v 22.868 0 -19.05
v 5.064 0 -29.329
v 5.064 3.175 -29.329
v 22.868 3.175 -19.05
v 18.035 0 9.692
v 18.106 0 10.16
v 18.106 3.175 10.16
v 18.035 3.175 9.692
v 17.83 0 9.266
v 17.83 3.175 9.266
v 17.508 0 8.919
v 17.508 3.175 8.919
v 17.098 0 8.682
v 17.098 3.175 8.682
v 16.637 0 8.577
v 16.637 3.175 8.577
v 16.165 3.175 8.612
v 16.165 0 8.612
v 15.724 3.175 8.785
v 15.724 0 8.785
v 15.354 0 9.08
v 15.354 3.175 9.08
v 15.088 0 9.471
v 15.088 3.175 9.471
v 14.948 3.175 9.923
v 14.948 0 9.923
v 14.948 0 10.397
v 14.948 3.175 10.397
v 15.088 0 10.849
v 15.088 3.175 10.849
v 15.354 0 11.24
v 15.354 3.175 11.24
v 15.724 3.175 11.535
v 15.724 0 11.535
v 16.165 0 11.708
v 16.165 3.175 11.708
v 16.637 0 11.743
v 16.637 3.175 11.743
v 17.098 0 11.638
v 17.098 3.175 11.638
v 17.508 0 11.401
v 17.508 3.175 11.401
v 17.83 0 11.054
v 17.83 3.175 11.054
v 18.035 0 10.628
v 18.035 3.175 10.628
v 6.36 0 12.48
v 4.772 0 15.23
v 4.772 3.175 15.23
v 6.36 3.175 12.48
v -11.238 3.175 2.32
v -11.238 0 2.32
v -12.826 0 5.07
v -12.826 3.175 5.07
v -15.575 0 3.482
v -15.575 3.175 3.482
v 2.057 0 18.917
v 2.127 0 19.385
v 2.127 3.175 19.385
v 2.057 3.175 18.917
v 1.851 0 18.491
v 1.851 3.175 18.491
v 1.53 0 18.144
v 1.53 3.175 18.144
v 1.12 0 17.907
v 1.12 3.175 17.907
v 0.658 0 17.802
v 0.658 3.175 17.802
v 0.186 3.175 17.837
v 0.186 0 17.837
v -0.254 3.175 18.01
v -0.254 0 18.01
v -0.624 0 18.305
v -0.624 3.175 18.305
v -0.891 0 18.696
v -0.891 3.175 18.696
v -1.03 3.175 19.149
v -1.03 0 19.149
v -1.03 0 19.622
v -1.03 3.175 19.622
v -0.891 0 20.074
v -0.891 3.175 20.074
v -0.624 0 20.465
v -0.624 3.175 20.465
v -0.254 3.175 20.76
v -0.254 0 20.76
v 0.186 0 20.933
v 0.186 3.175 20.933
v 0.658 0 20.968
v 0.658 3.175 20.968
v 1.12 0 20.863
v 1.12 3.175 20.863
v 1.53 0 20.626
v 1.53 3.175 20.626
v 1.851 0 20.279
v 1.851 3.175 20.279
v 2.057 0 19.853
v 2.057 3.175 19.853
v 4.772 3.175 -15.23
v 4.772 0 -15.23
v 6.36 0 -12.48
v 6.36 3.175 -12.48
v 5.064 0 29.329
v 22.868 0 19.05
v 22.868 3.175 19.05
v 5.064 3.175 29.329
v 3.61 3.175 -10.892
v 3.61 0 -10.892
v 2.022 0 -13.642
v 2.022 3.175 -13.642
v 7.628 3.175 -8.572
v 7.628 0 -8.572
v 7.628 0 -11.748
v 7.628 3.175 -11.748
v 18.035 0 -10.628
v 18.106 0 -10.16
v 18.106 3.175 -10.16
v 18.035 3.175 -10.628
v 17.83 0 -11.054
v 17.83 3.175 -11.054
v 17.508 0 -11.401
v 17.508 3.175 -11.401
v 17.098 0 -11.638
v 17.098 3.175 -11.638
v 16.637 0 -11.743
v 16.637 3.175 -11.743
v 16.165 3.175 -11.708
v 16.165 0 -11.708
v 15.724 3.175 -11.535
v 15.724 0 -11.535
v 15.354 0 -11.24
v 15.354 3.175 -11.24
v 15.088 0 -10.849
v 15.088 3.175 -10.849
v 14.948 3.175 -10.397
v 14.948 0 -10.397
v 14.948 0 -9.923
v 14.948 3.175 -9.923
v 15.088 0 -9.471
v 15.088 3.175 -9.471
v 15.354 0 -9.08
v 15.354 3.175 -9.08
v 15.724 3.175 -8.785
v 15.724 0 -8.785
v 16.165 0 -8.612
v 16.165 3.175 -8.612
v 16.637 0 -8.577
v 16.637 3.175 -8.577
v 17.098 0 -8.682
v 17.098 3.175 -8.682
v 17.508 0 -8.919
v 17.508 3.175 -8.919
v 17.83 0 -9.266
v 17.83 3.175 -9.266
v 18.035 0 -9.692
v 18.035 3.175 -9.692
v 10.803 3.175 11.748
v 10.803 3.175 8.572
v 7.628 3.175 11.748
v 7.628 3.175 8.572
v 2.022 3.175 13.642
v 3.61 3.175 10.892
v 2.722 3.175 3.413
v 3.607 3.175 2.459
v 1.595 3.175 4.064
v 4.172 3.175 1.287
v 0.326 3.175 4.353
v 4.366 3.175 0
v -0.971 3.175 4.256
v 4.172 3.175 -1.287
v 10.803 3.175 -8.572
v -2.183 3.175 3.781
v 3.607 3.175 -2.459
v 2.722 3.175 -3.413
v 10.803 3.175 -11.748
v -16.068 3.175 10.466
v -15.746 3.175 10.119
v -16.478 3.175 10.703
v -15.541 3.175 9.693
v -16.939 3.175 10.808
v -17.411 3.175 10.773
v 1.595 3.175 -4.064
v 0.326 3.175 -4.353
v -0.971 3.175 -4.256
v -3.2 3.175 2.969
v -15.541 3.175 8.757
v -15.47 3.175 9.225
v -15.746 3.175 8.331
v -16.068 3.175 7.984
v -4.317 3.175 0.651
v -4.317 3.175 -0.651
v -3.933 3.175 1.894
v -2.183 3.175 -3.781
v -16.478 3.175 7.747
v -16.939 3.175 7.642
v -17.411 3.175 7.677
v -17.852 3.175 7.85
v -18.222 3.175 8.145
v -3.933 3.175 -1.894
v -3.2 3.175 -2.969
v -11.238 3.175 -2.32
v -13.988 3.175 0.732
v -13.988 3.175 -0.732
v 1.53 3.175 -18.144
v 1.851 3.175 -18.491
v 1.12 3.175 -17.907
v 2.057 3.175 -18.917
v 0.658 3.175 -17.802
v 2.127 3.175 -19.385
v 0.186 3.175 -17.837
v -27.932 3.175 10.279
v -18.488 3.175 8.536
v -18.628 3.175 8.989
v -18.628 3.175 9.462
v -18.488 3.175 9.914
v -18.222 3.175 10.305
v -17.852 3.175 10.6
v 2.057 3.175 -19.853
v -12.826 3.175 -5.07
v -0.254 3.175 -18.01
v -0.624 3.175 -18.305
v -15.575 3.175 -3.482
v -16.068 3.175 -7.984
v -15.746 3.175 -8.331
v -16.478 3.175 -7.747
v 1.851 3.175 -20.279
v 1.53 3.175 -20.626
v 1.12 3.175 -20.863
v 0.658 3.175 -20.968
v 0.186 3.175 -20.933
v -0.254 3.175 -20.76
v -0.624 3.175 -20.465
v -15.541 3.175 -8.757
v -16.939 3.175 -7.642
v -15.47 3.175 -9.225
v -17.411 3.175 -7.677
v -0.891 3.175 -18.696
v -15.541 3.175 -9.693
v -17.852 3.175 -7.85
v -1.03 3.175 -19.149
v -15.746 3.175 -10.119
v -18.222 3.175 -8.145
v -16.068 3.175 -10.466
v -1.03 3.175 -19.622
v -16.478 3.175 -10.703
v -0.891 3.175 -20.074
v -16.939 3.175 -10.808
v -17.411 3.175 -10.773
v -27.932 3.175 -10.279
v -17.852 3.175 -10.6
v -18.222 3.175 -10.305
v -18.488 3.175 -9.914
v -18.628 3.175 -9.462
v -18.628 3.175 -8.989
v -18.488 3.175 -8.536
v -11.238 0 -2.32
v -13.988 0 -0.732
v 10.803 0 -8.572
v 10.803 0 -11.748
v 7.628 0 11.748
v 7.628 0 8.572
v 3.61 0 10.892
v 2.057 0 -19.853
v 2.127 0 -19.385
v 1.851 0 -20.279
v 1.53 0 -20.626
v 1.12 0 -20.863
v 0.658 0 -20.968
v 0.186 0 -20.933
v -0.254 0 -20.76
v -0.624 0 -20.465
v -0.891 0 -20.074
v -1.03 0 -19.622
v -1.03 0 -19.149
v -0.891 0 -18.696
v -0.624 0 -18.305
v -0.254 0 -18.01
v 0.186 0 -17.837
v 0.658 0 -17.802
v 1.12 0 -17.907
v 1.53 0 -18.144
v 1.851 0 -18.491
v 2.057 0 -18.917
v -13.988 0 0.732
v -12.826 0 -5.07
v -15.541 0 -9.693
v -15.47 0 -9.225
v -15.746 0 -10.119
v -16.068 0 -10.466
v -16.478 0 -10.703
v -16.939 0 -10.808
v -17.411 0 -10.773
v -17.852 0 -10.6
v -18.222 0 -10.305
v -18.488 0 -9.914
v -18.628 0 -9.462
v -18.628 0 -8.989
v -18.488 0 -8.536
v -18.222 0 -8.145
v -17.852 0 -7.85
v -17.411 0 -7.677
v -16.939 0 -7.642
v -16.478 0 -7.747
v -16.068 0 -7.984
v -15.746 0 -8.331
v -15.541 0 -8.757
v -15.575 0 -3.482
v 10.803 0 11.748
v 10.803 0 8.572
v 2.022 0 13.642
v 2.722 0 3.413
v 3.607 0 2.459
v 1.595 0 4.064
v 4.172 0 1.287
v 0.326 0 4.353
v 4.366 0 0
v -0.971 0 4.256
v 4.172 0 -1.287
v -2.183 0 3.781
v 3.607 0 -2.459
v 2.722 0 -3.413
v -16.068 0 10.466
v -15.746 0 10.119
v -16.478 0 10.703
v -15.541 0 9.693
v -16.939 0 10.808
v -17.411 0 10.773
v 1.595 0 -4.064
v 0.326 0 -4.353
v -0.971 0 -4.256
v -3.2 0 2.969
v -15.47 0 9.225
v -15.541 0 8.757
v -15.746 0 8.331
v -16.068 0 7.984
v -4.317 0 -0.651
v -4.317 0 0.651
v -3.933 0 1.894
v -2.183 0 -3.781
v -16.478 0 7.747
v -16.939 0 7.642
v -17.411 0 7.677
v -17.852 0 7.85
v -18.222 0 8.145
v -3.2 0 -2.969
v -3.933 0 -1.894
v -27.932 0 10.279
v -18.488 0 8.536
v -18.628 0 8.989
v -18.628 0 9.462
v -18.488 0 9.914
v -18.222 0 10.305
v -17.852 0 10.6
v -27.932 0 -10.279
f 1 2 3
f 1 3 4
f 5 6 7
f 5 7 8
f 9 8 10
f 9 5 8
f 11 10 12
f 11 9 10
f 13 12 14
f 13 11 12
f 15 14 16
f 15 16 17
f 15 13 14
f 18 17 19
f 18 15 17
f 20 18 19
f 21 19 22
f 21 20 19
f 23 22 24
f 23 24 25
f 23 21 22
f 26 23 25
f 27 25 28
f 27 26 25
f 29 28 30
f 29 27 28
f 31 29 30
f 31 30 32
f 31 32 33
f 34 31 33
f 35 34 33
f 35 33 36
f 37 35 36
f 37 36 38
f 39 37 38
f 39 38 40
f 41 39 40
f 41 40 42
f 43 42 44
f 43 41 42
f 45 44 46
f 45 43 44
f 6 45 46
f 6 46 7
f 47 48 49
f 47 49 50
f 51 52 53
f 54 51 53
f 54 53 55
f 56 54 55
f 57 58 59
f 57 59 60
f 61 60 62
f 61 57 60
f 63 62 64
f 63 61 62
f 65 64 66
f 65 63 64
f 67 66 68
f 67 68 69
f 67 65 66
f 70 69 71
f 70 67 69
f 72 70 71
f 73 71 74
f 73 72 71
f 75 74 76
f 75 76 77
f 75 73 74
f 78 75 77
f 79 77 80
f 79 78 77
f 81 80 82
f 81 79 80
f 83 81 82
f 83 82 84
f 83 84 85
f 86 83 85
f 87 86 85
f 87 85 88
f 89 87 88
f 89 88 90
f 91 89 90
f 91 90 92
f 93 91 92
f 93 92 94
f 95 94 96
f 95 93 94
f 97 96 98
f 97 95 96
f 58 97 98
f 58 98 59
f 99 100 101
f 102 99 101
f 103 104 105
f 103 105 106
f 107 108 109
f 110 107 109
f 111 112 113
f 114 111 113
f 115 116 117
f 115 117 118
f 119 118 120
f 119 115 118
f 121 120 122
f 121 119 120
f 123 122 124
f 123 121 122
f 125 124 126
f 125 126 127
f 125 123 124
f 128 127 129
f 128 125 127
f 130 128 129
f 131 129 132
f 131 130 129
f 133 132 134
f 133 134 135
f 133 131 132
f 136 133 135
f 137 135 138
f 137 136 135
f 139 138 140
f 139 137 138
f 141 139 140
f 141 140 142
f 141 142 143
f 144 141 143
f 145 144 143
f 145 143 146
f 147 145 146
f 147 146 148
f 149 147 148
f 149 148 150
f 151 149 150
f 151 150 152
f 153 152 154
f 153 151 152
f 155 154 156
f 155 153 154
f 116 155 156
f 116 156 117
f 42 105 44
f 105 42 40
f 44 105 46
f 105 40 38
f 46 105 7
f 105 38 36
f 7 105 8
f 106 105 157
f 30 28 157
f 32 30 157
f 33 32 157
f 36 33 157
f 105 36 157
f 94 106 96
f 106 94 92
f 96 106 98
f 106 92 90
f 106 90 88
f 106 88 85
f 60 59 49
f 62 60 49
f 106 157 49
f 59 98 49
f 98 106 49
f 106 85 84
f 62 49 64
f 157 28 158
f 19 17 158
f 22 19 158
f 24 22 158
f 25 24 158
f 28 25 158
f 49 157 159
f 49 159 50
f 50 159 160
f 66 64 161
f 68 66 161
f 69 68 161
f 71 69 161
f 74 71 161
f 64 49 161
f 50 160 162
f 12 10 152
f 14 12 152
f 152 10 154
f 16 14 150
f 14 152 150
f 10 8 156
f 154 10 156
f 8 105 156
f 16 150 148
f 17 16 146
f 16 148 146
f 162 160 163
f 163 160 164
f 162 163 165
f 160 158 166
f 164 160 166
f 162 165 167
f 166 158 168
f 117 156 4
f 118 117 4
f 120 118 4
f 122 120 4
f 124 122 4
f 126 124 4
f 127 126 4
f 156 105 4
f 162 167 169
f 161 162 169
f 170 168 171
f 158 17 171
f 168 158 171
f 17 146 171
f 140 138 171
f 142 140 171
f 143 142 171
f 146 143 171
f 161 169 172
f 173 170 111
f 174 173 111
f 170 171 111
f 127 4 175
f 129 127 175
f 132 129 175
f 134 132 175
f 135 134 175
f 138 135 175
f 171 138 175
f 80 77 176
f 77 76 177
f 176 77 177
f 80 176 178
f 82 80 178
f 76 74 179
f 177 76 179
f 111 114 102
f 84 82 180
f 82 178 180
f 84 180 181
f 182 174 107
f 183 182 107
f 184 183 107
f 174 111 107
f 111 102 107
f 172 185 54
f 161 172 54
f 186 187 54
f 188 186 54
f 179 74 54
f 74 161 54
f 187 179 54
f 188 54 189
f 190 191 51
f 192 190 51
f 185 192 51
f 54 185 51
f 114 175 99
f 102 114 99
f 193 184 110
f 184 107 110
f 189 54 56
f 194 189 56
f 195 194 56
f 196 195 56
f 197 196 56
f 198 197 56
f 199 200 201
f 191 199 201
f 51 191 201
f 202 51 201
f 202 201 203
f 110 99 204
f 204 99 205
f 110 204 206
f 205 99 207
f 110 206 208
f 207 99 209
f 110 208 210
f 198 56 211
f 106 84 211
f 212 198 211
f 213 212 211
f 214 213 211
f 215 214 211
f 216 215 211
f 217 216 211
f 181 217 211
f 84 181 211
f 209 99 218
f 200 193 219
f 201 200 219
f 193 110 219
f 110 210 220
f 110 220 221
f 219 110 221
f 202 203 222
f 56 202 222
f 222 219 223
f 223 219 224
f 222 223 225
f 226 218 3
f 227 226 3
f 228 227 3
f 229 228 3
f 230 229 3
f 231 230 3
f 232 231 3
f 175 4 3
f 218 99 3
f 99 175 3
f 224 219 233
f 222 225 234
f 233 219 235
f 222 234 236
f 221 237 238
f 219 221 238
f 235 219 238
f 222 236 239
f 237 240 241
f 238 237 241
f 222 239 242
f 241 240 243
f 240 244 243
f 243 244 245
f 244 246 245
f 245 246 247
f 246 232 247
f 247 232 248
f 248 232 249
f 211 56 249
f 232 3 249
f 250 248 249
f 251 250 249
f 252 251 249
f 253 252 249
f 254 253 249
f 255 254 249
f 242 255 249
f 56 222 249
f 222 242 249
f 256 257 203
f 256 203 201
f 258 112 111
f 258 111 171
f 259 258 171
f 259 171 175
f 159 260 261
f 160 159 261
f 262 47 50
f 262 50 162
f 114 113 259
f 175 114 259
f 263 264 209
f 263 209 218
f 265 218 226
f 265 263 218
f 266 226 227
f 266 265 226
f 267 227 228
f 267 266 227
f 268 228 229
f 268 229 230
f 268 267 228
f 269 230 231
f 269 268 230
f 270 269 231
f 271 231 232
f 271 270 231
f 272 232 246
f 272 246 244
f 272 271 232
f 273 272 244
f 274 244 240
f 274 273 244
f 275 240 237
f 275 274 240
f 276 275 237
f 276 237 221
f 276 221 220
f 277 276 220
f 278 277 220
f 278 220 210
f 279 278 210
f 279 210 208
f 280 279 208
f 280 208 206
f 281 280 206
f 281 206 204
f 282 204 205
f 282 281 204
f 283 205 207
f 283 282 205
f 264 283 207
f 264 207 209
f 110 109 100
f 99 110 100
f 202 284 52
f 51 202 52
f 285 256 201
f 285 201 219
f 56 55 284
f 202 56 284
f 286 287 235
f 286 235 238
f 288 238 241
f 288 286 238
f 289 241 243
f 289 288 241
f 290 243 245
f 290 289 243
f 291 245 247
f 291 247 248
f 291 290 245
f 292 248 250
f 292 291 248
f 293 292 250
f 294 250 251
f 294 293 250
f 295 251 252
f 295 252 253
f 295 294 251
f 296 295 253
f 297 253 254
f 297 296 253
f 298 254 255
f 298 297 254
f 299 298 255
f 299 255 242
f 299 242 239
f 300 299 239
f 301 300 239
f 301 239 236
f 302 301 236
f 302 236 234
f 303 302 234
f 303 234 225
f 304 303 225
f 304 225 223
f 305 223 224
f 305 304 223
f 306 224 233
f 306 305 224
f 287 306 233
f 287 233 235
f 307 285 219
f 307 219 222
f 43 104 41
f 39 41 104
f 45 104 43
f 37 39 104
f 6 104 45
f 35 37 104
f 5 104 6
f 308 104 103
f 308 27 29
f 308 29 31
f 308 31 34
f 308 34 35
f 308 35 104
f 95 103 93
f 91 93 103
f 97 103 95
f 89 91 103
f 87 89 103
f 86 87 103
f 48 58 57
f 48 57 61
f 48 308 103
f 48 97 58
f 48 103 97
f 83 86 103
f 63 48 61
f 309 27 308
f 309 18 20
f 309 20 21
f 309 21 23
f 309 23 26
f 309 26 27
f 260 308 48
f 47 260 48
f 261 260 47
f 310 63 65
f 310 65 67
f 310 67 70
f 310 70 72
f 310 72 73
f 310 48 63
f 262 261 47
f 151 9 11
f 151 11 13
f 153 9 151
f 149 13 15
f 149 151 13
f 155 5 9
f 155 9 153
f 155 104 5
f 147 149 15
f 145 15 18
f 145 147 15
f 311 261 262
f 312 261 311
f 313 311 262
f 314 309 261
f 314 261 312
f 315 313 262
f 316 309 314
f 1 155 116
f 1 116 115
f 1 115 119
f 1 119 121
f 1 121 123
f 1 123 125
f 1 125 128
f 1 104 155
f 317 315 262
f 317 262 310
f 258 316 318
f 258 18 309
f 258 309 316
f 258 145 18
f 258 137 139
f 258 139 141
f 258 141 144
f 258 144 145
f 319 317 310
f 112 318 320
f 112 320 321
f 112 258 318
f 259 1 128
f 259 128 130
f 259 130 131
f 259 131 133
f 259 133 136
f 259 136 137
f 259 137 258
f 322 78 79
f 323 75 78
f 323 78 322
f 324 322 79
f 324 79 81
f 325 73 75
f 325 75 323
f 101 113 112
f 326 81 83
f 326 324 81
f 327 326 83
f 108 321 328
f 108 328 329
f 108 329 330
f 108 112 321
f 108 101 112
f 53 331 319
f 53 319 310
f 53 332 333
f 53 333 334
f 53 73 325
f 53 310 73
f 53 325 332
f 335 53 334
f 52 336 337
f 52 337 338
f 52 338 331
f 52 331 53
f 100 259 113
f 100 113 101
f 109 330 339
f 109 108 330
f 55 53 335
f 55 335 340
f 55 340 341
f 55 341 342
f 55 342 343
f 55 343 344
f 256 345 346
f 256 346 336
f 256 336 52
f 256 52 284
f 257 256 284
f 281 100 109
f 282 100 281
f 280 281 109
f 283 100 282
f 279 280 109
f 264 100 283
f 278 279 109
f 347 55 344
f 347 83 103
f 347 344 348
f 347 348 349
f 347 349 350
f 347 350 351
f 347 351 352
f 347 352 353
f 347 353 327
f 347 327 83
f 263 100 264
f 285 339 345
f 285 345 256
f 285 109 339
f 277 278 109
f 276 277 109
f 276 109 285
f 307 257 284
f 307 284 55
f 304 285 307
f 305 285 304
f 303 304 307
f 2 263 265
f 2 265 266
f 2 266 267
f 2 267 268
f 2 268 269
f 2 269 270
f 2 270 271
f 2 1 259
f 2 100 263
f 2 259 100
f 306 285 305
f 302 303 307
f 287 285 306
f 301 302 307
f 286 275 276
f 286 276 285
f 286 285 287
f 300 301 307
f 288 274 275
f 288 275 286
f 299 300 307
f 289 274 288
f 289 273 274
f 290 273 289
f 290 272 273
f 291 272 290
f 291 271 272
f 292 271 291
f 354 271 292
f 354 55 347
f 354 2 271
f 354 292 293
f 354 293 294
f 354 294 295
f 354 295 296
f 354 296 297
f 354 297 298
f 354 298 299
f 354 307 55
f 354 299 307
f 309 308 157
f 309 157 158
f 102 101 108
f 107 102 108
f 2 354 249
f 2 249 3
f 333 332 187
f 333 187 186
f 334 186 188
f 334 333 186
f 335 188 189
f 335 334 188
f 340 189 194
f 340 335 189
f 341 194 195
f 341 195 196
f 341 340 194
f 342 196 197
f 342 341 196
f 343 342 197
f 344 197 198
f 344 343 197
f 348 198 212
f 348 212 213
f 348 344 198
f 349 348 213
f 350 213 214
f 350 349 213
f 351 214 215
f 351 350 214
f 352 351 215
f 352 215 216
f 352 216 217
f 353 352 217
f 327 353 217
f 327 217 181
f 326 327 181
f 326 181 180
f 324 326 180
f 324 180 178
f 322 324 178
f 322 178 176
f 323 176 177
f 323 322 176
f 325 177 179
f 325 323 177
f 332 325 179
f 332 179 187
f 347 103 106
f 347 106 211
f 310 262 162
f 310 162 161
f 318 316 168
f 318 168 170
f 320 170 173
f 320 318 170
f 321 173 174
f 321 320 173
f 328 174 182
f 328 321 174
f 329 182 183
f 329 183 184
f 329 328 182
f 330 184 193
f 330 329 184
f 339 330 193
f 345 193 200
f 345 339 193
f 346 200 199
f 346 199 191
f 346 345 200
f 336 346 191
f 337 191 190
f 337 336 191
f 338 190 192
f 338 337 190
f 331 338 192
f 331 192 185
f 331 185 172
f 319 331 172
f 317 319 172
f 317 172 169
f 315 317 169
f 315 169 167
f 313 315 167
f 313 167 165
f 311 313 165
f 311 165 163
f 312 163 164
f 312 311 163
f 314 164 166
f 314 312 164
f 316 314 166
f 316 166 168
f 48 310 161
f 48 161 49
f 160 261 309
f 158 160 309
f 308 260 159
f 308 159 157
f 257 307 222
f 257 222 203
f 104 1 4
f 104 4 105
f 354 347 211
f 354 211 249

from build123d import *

# Parameters (mm, degrees)
SKETCH2_R           = 1.5875
SKETCH2_R_2         = 4.365625
SKETCH2_W           = 3.175
SKETCH2_H           = 3.175
BOSS_EXTRUDE2_DEPTH = 3.175


with BuildPart() as part:
    # Sketch2 → Boss-Extrude2 (new body)
    with BuildSketch(Plane(origin=(0, 0, 0), x_dir=(1, 0, 0), z_dir=(0, 1, 0))):
        Polygon((22.868144039, 19.05), (22.868144039, -19.05), (5.063711923, -29.329393675), (-27.931855961, -10.279393675), (-27.931855961, 10.279393675), (5.063711923, 29.329393675), align=None)
        with Locations((16.518144039, 10.16)):
            Circle(SKETCH2_R, mode=Mode.SUBTRACT)
        with Locations((16.518144039, -10.16)):
            Circle(SKETCH2_R, mode=Mode.SUBTRACT)
        with Locations((0.539746083, -19.385132361)):
            Circle(SKETCH2_R, mode=Mode.SUBTRACT)
        Circle(SKETCH2_R_2, mode=Mode.SUBTRACT)
        with Locations((-17.057890122, -9.225132361)):
            Circle(SKETCH2_R, mode=Mode.SUBTRACT)
        with Locations((-17.057890122, 9.225132361)):
            Circle(SKETCH2_R, mode=Mode.SUBTRACT)
        with Locations((0.539746083, 19.385132361)):
            Circle(SKETCH2_R, mode=Mode.SUBTRACT)
        with Locations((9.215644039, 10.16)):
            Rectangle(SKETCH2_W, SKETCH2_H, mode=Mode.SUBTRACT)
        with Locations((9.215644039, -10.16)):
            Rectangle(SKETCH2_W, SKETCH2_H, mode=Mode.SUBTRACT)
        Polygon((3.609930755, -10.892416521), (2.022430755, -13.642047178), (4.772061412, -15.229547178), (6.359561412, -12.479916521), align=None, mode=Mode.SUBTRACT)
        Polygon((-11.238074793, -2.319916521), (-12.825574793, -5.069547178), (-15.57520545, -3.482047178), (-13.98770545, -0.732416521), align=None, mode=Mode.SUBTRACT)
        Polygon((-11.238074793, 2.319916521), (-12.825574793, 5.069547178), (-15.57520545, 3.482047178), (-13.98770545, 0.732416521), align=None, mode=Mode.SUBTRACT)
        Polygon((3.609930755, 10.892416521), (2.022430755, 13.642047178), (4.772061412, 15.229547178), (6.359561412, 12.479916521), align=None, mode=Mode.SUBTRACT)
    extrude(amount=BOSS_EXTRUDE2_DEPTH)


solid = part.part
